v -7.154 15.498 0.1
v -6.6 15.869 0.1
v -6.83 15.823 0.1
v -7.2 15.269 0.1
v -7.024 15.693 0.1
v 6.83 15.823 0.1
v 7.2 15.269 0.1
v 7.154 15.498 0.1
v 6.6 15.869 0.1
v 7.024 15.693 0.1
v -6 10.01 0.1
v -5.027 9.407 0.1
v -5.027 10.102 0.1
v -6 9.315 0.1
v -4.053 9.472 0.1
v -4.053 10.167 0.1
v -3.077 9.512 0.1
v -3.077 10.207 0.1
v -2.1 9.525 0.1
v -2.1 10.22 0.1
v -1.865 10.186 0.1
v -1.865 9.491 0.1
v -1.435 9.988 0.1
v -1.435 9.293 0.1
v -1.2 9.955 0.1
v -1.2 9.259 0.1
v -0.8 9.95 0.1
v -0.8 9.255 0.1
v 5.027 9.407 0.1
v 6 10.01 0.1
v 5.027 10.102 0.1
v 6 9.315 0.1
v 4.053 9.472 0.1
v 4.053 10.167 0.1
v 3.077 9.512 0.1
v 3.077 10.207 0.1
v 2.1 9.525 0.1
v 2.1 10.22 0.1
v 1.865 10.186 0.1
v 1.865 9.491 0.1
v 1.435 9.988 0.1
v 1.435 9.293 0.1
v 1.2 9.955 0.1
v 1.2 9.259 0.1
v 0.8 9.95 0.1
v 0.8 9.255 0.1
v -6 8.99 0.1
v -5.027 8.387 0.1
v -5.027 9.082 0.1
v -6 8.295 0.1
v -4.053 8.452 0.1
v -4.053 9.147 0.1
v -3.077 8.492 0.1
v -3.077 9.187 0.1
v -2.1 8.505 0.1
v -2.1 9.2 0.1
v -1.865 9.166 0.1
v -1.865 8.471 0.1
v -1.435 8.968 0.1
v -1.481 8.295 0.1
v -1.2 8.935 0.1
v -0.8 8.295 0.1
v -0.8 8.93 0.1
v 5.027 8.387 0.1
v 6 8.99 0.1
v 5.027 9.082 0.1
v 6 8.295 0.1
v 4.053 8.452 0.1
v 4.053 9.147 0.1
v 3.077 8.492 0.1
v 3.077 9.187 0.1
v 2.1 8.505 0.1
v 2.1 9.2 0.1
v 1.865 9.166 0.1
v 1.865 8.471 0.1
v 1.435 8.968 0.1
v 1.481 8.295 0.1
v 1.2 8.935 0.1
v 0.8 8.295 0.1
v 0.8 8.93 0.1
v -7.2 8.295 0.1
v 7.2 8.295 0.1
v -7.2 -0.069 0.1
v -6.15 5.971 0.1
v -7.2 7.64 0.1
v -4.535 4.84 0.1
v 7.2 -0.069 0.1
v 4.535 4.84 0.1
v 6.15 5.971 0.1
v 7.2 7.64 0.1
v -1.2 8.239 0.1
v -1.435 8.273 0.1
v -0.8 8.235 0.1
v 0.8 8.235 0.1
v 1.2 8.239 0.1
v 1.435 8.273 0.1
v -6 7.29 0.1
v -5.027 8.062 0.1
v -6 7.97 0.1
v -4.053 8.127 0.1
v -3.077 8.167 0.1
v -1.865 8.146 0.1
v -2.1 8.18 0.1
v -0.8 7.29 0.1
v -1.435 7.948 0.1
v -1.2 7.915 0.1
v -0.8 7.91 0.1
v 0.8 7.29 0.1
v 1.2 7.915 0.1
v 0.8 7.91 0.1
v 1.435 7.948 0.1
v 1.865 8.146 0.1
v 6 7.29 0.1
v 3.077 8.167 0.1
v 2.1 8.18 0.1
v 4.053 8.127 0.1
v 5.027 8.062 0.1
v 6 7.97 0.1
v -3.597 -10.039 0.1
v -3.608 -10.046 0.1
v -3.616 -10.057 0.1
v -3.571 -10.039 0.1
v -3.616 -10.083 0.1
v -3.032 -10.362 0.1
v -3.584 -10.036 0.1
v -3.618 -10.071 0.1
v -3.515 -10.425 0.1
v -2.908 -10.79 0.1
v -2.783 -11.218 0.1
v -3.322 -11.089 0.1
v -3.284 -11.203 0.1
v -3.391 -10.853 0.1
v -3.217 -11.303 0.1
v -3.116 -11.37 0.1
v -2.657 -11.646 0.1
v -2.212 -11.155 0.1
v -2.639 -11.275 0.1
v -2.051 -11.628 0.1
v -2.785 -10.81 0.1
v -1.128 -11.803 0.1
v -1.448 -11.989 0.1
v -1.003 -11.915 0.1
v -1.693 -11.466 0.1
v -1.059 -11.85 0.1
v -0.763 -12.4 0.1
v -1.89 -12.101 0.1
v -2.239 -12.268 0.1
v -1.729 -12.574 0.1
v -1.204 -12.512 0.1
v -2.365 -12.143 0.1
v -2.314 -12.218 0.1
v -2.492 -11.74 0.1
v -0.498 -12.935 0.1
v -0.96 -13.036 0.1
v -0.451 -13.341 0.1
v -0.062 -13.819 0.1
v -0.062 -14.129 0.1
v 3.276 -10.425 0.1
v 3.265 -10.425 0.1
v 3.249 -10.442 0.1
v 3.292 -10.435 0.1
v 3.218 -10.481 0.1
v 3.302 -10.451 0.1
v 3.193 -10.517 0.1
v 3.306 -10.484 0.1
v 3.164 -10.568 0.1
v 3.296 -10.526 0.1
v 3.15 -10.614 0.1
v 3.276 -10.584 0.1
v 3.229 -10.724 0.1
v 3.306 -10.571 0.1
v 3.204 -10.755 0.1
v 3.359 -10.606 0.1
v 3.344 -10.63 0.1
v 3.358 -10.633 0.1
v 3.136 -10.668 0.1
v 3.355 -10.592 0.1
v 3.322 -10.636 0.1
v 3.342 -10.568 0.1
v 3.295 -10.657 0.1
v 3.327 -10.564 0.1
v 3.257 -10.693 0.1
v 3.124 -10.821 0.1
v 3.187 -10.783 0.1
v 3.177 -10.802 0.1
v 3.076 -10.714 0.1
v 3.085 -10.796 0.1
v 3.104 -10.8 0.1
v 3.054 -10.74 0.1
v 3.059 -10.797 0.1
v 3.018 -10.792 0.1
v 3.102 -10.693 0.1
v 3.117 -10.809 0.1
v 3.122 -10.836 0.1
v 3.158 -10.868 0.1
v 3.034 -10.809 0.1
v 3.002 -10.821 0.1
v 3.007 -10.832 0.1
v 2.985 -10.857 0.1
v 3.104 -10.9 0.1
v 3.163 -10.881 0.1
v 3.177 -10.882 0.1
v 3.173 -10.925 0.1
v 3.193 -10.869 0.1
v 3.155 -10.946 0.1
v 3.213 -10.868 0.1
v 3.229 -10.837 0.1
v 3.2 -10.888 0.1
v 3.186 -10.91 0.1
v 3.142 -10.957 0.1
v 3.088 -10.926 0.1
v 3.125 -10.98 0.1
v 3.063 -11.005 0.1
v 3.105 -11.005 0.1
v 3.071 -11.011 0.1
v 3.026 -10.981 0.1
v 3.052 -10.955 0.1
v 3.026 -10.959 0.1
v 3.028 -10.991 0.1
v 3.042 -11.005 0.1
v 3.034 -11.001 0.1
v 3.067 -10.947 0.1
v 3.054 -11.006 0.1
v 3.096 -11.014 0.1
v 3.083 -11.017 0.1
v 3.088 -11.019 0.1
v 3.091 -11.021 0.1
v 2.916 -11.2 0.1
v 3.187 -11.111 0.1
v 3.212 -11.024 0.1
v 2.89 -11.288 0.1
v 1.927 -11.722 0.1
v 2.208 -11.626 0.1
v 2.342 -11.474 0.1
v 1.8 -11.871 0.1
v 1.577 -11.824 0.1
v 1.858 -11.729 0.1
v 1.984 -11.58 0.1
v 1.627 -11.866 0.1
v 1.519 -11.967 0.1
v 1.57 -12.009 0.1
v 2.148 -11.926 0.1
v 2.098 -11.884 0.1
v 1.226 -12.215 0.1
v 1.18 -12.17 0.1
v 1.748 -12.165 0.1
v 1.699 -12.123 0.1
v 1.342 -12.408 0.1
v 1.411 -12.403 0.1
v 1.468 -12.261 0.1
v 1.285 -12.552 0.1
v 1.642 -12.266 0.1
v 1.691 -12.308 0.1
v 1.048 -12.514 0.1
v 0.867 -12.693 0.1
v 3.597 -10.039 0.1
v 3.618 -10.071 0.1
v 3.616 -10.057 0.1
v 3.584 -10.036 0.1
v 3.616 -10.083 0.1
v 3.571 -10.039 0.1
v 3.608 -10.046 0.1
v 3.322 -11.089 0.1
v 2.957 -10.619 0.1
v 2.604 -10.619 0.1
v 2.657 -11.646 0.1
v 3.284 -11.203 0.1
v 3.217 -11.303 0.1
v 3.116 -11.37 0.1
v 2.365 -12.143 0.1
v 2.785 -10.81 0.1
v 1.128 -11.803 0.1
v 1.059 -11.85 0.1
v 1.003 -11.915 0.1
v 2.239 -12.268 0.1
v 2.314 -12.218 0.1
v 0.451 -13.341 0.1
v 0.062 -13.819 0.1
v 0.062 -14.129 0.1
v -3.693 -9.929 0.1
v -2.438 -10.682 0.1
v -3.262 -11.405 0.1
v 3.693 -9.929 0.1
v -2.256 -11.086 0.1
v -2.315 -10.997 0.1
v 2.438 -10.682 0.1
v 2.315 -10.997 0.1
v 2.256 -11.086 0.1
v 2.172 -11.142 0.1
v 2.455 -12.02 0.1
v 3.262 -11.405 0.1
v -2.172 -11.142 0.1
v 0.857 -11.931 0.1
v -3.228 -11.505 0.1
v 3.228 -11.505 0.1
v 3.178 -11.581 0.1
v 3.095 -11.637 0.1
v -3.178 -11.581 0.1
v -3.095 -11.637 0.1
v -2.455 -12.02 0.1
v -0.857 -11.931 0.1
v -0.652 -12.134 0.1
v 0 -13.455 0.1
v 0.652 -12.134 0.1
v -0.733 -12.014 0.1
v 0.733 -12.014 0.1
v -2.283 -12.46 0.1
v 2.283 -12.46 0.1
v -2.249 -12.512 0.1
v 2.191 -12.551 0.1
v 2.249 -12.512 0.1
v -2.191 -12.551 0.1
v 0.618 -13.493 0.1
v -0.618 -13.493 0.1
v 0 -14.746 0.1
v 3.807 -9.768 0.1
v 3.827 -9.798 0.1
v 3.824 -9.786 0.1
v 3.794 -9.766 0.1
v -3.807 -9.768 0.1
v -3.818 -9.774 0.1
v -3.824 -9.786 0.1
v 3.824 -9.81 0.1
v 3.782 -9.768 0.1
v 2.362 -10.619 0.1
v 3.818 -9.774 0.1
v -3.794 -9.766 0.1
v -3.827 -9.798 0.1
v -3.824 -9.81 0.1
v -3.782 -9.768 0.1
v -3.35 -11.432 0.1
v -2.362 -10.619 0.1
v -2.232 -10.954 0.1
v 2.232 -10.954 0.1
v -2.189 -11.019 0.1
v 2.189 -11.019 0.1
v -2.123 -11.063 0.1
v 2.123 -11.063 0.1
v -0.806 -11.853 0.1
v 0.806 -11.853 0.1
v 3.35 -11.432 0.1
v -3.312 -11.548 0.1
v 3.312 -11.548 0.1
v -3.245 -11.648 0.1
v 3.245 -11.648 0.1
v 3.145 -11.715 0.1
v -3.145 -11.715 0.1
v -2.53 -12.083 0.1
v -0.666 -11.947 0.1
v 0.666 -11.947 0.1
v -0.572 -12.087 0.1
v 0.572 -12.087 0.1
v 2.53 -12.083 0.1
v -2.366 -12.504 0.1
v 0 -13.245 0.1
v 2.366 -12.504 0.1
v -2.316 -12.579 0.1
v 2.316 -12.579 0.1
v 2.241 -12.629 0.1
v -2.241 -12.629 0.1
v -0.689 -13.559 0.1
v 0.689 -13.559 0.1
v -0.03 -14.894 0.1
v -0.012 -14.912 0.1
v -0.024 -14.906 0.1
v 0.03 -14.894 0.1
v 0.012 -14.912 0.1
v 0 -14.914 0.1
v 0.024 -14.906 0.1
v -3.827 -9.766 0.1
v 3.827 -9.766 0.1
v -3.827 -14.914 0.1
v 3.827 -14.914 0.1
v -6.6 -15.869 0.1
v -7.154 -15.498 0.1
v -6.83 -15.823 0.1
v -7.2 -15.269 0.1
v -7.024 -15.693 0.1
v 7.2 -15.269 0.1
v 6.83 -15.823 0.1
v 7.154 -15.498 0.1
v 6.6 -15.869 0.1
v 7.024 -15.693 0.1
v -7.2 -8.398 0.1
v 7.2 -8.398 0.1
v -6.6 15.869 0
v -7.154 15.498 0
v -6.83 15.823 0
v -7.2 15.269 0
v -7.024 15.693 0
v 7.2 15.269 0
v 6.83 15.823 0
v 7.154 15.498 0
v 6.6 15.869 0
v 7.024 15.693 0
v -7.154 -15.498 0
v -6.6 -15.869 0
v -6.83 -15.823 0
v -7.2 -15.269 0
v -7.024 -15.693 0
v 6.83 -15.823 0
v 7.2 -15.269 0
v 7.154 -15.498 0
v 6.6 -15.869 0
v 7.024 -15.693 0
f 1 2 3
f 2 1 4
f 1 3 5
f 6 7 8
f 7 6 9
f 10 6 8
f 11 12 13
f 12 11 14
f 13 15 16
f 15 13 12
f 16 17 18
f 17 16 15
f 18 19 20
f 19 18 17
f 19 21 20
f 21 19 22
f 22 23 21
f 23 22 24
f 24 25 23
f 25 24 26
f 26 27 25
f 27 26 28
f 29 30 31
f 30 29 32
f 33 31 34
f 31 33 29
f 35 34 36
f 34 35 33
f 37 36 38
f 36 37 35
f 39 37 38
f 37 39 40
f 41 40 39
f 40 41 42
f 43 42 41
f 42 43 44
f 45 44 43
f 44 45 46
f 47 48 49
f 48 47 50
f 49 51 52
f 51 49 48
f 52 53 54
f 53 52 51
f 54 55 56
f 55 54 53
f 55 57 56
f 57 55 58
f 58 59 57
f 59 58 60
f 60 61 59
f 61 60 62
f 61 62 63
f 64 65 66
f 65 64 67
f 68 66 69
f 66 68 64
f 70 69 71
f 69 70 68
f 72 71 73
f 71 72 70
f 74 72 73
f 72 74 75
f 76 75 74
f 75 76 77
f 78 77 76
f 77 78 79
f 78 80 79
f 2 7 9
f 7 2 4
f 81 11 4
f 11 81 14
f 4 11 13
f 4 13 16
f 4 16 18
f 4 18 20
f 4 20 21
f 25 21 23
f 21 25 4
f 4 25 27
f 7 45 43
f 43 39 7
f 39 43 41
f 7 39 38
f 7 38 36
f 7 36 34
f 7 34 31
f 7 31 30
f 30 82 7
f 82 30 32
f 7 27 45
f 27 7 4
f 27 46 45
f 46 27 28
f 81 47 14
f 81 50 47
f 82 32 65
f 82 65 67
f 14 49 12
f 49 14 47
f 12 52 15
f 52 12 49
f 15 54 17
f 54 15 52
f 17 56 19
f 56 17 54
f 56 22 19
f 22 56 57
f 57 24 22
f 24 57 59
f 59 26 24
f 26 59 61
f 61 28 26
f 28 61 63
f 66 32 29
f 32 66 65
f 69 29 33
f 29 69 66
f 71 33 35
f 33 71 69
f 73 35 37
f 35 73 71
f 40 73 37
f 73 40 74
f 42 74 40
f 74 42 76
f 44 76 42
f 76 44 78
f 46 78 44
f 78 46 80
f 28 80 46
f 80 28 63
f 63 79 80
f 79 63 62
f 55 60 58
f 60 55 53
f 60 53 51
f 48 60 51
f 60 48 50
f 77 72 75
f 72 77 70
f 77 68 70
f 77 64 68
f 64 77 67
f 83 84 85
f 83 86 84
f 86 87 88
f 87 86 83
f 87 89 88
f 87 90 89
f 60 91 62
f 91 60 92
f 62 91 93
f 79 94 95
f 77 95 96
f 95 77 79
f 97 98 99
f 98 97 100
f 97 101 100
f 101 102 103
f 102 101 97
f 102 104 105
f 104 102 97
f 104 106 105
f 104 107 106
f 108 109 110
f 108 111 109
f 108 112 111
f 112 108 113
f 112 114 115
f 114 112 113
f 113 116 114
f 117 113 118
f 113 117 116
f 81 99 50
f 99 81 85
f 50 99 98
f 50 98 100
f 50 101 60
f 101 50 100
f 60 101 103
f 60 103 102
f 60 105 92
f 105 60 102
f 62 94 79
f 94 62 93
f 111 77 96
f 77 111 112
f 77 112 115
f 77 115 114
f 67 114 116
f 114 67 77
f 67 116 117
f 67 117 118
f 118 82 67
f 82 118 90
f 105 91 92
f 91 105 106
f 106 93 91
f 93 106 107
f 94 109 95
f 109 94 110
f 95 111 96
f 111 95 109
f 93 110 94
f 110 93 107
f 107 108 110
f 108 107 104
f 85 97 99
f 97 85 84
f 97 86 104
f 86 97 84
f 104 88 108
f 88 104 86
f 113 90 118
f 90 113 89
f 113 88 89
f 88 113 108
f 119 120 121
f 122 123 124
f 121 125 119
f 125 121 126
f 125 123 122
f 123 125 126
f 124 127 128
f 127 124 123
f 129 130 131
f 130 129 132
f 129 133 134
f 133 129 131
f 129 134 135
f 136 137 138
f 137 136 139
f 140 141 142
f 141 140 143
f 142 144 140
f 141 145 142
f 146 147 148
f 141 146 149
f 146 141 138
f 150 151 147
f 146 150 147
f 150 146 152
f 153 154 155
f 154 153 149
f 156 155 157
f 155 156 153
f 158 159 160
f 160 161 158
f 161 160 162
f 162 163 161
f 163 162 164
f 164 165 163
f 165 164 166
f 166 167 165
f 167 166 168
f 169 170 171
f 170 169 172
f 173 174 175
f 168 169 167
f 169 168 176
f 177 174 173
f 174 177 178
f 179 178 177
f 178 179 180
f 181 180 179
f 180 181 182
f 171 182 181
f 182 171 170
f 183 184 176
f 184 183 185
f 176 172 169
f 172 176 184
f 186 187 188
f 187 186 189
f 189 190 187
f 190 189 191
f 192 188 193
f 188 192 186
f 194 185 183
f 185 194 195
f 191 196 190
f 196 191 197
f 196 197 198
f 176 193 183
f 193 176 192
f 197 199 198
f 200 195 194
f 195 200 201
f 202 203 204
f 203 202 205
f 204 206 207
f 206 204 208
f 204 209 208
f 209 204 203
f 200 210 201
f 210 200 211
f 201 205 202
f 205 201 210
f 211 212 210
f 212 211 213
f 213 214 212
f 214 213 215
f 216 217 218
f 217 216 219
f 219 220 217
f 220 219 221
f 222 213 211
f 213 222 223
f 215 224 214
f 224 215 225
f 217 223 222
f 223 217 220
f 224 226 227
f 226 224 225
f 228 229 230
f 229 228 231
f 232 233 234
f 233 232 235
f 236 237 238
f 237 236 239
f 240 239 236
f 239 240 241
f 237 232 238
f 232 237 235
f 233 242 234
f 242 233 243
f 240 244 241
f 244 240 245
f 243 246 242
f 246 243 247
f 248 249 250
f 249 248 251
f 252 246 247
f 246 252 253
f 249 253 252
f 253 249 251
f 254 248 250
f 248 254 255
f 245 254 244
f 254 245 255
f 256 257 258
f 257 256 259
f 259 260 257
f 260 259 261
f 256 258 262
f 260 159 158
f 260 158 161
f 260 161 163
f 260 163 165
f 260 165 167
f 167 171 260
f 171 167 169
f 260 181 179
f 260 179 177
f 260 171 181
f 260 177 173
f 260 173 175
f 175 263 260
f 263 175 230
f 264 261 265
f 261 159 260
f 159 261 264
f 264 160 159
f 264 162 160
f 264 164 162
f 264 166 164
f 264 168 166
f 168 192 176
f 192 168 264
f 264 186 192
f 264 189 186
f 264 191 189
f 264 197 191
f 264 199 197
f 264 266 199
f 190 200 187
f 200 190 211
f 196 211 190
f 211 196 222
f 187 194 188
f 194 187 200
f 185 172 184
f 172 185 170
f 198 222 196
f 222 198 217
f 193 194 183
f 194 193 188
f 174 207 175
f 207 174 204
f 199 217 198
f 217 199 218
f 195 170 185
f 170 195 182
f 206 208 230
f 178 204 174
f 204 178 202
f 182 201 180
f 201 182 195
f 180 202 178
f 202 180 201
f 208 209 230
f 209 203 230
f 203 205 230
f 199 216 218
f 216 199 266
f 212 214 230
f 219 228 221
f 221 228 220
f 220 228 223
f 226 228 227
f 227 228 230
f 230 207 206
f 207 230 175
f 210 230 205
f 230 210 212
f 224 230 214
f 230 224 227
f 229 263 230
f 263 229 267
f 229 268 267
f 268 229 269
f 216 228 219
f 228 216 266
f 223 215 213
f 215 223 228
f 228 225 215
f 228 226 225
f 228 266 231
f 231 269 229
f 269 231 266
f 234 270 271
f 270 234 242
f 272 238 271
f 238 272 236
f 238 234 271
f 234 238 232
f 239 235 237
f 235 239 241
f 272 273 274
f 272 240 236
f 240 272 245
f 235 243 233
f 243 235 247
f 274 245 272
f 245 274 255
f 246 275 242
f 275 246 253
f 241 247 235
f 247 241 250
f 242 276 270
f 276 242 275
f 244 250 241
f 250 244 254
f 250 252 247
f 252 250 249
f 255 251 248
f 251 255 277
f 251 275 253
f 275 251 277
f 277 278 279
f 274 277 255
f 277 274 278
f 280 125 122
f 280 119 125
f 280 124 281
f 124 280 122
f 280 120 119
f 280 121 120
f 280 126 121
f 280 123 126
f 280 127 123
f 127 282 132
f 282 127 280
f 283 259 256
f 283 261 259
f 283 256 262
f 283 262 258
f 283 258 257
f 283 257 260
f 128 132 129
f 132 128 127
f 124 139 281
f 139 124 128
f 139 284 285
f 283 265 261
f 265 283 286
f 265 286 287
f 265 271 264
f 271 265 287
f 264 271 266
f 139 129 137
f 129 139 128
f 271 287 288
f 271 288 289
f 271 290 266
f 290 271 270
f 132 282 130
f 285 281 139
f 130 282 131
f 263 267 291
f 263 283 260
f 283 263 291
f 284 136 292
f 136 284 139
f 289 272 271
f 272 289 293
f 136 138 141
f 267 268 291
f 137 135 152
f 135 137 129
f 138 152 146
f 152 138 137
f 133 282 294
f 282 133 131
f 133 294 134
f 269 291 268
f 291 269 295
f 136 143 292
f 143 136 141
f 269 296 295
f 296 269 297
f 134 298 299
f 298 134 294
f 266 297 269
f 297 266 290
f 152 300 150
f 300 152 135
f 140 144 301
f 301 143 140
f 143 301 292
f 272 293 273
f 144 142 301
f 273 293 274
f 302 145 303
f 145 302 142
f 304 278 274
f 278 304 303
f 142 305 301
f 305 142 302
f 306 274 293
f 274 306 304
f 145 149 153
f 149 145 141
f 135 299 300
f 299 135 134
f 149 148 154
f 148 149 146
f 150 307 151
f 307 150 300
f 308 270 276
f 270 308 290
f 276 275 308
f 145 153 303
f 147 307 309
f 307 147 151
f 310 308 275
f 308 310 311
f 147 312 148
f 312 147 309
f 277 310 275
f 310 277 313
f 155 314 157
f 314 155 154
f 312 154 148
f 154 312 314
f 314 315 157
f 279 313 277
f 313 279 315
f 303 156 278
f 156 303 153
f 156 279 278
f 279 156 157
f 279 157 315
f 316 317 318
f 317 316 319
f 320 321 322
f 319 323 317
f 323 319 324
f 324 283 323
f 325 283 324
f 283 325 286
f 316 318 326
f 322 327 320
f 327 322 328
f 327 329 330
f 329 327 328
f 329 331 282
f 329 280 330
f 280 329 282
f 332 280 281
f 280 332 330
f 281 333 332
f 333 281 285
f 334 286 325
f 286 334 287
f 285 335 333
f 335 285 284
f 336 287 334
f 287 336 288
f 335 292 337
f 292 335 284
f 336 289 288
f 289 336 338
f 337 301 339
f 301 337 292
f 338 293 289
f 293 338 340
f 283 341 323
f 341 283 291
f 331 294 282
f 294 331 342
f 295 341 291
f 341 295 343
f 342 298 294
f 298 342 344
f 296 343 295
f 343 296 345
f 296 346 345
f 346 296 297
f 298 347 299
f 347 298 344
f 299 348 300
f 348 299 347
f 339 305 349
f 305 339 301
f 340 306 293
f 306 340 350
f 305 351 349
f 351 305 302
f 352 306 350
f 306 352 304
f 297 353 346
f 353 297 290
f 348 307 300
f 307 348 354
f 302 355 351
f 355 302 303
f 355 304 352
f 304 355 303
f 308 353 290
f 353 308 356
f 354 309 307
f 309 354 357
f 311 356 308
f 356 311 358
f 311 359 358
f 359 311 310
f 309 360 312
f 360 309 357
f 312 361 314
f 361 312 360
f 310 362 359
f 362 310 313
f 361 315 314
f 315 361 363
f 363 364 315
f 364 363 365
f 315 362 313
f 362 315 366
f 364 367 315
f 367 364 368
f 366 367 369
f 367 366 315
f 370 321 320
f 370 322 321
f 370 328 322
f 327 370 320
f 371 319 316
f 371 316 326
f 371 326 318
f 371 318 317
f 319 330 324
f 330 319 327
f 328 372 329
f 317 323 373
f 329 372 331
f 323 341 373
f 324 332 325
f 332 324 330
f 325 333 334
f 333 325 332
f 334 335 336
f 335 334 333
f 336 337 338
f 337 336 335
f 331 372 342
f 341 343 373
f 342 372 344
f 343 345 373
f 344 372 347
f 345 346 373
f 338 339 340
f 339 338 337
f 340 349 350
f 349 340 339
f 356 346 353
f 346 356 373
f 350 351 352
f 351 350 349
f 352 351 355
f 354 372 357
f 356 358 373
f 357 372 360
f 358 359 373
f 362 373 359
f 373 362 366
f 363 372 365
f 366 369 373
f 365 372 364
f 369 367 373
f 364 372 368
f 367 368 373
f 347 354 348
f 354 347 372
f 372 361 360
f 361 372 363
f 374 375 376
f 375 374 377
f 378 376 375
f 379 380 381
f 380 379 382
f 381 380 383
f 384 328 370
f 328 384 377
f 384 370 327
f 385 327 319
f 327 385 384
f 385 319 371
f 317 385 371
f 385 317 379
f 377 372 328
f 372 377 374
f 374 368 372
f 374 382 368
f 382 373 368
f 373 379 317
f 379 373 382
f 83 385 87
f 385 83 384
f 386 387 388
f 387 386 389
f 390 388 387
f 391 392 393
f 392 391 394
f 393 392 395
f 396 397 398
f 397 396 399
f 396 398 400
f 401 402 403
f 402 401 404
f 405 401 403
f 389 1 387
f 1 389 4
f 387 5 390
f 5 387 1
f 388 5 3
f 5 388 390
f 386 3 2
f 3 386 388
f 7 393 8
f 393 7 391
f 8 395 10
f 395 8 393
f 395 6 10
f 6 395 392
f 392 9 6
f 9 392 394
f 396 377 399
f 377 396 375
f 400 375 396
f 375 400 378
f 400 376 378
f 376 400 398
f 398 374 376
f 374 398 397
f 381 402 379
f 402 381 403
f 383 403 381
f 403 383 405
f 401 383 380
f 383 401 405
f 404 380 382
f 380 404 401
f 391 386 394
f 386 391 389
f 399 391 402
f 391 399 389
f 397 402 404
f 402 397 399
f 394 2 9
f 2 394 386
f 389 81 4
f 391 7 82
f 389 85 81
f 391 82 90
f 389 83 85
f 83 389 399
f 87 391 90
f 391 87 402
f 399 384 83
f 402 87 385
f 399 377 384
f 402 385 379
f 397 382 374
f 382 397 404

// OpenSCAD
use <../lib.scad>
use <s/6142622rs01.scad>
use <s/6142622rs02.scad>
use <s/6142622rs03.scad>
use <s/6142622rs04.scad>
$fa=1; $fs=0.2;
function ldraw_lib__6142622r(realsolid=false) = [
// 0 Sticker  4.0 x  1.8 with Chevrolet Corvette Z06-C7 Logo on Yellow Background and Dark Grey Air Vents on Black Background
// 0 Name: 6142622r.dat
// 0 Author: Massimo Maso [Sirio]
// 0 !LDRAW_ORG Part UPDATE 2022-03
// 0 !LICENSE Licensed under CC BY 2.0 and CC BY 4.0 : see CAreadme.txt
// 
// 0 BFC CERTIFY CCW
  [0,"BFC","CERTIFY"],
  [0,"BFC","CCW"],
// 
// 0 !KEYWORDS Set 75870, Speed Champions
// 
// 0 !HISTORY 2022-05-07 [PTadmin] Official Update 2022-03
// 
// 
// 1 16 0 0 20.7523 1 0 0 0 1 0 0 0 1 s\6142622rs01.dat
  [1,16,0,0,20.7523,1,0,0,0,1,0,0,0,1, ldraw_lib__s__6142622rs01(realsolid)],
// 1 16 0 0 20.7217 1 0 0 0 1 0 0 0 1 s\6142622rs02.dat
  [1,16,0,0,20.7217,1,0,0,0,1,0,0,0,1, ldraw_lib__s__6142622rs02(realsolid)],
// 1 16 0 0 -21.0097 1 0 0 0 1 0 0 0 1 s\6142622rs03.dat
  [1,16,0,0,-21.0097,1,0,0,0,1,0,0,0,1, ldraw_lib__s__6142622rs03(realsolid)],
// 4 14 -18 -.25 -.1714 -18 -.25 -20.994 18 -.25 -20.994 18 -.25 -.1714
  [4,14,-18,-.25,-.1714,-18,-.25,-20.994,18,-.25,-20.994,18,-.25,-.1714],
// 1 16 0 0 0 1 0 0 0 1 0 0 0 1 s\6142622rs04.dat
  [1,16,0,0,0,1,0,0,0,1,0,0,0,1, ldraw_lib__s__6142622rs04(realsolid)],
];
module ldraw_lib__6142622r(step=0, col=false, unit=2/5, alt=false, line=0.2, solid=!$preview)
    makepoly(ldraw_lib__6142622r(solid), step=step, col=col, unit=unit, alt=alt, line=line, solid=solid);
ldraw_lib__6142622r(line=0.2);
